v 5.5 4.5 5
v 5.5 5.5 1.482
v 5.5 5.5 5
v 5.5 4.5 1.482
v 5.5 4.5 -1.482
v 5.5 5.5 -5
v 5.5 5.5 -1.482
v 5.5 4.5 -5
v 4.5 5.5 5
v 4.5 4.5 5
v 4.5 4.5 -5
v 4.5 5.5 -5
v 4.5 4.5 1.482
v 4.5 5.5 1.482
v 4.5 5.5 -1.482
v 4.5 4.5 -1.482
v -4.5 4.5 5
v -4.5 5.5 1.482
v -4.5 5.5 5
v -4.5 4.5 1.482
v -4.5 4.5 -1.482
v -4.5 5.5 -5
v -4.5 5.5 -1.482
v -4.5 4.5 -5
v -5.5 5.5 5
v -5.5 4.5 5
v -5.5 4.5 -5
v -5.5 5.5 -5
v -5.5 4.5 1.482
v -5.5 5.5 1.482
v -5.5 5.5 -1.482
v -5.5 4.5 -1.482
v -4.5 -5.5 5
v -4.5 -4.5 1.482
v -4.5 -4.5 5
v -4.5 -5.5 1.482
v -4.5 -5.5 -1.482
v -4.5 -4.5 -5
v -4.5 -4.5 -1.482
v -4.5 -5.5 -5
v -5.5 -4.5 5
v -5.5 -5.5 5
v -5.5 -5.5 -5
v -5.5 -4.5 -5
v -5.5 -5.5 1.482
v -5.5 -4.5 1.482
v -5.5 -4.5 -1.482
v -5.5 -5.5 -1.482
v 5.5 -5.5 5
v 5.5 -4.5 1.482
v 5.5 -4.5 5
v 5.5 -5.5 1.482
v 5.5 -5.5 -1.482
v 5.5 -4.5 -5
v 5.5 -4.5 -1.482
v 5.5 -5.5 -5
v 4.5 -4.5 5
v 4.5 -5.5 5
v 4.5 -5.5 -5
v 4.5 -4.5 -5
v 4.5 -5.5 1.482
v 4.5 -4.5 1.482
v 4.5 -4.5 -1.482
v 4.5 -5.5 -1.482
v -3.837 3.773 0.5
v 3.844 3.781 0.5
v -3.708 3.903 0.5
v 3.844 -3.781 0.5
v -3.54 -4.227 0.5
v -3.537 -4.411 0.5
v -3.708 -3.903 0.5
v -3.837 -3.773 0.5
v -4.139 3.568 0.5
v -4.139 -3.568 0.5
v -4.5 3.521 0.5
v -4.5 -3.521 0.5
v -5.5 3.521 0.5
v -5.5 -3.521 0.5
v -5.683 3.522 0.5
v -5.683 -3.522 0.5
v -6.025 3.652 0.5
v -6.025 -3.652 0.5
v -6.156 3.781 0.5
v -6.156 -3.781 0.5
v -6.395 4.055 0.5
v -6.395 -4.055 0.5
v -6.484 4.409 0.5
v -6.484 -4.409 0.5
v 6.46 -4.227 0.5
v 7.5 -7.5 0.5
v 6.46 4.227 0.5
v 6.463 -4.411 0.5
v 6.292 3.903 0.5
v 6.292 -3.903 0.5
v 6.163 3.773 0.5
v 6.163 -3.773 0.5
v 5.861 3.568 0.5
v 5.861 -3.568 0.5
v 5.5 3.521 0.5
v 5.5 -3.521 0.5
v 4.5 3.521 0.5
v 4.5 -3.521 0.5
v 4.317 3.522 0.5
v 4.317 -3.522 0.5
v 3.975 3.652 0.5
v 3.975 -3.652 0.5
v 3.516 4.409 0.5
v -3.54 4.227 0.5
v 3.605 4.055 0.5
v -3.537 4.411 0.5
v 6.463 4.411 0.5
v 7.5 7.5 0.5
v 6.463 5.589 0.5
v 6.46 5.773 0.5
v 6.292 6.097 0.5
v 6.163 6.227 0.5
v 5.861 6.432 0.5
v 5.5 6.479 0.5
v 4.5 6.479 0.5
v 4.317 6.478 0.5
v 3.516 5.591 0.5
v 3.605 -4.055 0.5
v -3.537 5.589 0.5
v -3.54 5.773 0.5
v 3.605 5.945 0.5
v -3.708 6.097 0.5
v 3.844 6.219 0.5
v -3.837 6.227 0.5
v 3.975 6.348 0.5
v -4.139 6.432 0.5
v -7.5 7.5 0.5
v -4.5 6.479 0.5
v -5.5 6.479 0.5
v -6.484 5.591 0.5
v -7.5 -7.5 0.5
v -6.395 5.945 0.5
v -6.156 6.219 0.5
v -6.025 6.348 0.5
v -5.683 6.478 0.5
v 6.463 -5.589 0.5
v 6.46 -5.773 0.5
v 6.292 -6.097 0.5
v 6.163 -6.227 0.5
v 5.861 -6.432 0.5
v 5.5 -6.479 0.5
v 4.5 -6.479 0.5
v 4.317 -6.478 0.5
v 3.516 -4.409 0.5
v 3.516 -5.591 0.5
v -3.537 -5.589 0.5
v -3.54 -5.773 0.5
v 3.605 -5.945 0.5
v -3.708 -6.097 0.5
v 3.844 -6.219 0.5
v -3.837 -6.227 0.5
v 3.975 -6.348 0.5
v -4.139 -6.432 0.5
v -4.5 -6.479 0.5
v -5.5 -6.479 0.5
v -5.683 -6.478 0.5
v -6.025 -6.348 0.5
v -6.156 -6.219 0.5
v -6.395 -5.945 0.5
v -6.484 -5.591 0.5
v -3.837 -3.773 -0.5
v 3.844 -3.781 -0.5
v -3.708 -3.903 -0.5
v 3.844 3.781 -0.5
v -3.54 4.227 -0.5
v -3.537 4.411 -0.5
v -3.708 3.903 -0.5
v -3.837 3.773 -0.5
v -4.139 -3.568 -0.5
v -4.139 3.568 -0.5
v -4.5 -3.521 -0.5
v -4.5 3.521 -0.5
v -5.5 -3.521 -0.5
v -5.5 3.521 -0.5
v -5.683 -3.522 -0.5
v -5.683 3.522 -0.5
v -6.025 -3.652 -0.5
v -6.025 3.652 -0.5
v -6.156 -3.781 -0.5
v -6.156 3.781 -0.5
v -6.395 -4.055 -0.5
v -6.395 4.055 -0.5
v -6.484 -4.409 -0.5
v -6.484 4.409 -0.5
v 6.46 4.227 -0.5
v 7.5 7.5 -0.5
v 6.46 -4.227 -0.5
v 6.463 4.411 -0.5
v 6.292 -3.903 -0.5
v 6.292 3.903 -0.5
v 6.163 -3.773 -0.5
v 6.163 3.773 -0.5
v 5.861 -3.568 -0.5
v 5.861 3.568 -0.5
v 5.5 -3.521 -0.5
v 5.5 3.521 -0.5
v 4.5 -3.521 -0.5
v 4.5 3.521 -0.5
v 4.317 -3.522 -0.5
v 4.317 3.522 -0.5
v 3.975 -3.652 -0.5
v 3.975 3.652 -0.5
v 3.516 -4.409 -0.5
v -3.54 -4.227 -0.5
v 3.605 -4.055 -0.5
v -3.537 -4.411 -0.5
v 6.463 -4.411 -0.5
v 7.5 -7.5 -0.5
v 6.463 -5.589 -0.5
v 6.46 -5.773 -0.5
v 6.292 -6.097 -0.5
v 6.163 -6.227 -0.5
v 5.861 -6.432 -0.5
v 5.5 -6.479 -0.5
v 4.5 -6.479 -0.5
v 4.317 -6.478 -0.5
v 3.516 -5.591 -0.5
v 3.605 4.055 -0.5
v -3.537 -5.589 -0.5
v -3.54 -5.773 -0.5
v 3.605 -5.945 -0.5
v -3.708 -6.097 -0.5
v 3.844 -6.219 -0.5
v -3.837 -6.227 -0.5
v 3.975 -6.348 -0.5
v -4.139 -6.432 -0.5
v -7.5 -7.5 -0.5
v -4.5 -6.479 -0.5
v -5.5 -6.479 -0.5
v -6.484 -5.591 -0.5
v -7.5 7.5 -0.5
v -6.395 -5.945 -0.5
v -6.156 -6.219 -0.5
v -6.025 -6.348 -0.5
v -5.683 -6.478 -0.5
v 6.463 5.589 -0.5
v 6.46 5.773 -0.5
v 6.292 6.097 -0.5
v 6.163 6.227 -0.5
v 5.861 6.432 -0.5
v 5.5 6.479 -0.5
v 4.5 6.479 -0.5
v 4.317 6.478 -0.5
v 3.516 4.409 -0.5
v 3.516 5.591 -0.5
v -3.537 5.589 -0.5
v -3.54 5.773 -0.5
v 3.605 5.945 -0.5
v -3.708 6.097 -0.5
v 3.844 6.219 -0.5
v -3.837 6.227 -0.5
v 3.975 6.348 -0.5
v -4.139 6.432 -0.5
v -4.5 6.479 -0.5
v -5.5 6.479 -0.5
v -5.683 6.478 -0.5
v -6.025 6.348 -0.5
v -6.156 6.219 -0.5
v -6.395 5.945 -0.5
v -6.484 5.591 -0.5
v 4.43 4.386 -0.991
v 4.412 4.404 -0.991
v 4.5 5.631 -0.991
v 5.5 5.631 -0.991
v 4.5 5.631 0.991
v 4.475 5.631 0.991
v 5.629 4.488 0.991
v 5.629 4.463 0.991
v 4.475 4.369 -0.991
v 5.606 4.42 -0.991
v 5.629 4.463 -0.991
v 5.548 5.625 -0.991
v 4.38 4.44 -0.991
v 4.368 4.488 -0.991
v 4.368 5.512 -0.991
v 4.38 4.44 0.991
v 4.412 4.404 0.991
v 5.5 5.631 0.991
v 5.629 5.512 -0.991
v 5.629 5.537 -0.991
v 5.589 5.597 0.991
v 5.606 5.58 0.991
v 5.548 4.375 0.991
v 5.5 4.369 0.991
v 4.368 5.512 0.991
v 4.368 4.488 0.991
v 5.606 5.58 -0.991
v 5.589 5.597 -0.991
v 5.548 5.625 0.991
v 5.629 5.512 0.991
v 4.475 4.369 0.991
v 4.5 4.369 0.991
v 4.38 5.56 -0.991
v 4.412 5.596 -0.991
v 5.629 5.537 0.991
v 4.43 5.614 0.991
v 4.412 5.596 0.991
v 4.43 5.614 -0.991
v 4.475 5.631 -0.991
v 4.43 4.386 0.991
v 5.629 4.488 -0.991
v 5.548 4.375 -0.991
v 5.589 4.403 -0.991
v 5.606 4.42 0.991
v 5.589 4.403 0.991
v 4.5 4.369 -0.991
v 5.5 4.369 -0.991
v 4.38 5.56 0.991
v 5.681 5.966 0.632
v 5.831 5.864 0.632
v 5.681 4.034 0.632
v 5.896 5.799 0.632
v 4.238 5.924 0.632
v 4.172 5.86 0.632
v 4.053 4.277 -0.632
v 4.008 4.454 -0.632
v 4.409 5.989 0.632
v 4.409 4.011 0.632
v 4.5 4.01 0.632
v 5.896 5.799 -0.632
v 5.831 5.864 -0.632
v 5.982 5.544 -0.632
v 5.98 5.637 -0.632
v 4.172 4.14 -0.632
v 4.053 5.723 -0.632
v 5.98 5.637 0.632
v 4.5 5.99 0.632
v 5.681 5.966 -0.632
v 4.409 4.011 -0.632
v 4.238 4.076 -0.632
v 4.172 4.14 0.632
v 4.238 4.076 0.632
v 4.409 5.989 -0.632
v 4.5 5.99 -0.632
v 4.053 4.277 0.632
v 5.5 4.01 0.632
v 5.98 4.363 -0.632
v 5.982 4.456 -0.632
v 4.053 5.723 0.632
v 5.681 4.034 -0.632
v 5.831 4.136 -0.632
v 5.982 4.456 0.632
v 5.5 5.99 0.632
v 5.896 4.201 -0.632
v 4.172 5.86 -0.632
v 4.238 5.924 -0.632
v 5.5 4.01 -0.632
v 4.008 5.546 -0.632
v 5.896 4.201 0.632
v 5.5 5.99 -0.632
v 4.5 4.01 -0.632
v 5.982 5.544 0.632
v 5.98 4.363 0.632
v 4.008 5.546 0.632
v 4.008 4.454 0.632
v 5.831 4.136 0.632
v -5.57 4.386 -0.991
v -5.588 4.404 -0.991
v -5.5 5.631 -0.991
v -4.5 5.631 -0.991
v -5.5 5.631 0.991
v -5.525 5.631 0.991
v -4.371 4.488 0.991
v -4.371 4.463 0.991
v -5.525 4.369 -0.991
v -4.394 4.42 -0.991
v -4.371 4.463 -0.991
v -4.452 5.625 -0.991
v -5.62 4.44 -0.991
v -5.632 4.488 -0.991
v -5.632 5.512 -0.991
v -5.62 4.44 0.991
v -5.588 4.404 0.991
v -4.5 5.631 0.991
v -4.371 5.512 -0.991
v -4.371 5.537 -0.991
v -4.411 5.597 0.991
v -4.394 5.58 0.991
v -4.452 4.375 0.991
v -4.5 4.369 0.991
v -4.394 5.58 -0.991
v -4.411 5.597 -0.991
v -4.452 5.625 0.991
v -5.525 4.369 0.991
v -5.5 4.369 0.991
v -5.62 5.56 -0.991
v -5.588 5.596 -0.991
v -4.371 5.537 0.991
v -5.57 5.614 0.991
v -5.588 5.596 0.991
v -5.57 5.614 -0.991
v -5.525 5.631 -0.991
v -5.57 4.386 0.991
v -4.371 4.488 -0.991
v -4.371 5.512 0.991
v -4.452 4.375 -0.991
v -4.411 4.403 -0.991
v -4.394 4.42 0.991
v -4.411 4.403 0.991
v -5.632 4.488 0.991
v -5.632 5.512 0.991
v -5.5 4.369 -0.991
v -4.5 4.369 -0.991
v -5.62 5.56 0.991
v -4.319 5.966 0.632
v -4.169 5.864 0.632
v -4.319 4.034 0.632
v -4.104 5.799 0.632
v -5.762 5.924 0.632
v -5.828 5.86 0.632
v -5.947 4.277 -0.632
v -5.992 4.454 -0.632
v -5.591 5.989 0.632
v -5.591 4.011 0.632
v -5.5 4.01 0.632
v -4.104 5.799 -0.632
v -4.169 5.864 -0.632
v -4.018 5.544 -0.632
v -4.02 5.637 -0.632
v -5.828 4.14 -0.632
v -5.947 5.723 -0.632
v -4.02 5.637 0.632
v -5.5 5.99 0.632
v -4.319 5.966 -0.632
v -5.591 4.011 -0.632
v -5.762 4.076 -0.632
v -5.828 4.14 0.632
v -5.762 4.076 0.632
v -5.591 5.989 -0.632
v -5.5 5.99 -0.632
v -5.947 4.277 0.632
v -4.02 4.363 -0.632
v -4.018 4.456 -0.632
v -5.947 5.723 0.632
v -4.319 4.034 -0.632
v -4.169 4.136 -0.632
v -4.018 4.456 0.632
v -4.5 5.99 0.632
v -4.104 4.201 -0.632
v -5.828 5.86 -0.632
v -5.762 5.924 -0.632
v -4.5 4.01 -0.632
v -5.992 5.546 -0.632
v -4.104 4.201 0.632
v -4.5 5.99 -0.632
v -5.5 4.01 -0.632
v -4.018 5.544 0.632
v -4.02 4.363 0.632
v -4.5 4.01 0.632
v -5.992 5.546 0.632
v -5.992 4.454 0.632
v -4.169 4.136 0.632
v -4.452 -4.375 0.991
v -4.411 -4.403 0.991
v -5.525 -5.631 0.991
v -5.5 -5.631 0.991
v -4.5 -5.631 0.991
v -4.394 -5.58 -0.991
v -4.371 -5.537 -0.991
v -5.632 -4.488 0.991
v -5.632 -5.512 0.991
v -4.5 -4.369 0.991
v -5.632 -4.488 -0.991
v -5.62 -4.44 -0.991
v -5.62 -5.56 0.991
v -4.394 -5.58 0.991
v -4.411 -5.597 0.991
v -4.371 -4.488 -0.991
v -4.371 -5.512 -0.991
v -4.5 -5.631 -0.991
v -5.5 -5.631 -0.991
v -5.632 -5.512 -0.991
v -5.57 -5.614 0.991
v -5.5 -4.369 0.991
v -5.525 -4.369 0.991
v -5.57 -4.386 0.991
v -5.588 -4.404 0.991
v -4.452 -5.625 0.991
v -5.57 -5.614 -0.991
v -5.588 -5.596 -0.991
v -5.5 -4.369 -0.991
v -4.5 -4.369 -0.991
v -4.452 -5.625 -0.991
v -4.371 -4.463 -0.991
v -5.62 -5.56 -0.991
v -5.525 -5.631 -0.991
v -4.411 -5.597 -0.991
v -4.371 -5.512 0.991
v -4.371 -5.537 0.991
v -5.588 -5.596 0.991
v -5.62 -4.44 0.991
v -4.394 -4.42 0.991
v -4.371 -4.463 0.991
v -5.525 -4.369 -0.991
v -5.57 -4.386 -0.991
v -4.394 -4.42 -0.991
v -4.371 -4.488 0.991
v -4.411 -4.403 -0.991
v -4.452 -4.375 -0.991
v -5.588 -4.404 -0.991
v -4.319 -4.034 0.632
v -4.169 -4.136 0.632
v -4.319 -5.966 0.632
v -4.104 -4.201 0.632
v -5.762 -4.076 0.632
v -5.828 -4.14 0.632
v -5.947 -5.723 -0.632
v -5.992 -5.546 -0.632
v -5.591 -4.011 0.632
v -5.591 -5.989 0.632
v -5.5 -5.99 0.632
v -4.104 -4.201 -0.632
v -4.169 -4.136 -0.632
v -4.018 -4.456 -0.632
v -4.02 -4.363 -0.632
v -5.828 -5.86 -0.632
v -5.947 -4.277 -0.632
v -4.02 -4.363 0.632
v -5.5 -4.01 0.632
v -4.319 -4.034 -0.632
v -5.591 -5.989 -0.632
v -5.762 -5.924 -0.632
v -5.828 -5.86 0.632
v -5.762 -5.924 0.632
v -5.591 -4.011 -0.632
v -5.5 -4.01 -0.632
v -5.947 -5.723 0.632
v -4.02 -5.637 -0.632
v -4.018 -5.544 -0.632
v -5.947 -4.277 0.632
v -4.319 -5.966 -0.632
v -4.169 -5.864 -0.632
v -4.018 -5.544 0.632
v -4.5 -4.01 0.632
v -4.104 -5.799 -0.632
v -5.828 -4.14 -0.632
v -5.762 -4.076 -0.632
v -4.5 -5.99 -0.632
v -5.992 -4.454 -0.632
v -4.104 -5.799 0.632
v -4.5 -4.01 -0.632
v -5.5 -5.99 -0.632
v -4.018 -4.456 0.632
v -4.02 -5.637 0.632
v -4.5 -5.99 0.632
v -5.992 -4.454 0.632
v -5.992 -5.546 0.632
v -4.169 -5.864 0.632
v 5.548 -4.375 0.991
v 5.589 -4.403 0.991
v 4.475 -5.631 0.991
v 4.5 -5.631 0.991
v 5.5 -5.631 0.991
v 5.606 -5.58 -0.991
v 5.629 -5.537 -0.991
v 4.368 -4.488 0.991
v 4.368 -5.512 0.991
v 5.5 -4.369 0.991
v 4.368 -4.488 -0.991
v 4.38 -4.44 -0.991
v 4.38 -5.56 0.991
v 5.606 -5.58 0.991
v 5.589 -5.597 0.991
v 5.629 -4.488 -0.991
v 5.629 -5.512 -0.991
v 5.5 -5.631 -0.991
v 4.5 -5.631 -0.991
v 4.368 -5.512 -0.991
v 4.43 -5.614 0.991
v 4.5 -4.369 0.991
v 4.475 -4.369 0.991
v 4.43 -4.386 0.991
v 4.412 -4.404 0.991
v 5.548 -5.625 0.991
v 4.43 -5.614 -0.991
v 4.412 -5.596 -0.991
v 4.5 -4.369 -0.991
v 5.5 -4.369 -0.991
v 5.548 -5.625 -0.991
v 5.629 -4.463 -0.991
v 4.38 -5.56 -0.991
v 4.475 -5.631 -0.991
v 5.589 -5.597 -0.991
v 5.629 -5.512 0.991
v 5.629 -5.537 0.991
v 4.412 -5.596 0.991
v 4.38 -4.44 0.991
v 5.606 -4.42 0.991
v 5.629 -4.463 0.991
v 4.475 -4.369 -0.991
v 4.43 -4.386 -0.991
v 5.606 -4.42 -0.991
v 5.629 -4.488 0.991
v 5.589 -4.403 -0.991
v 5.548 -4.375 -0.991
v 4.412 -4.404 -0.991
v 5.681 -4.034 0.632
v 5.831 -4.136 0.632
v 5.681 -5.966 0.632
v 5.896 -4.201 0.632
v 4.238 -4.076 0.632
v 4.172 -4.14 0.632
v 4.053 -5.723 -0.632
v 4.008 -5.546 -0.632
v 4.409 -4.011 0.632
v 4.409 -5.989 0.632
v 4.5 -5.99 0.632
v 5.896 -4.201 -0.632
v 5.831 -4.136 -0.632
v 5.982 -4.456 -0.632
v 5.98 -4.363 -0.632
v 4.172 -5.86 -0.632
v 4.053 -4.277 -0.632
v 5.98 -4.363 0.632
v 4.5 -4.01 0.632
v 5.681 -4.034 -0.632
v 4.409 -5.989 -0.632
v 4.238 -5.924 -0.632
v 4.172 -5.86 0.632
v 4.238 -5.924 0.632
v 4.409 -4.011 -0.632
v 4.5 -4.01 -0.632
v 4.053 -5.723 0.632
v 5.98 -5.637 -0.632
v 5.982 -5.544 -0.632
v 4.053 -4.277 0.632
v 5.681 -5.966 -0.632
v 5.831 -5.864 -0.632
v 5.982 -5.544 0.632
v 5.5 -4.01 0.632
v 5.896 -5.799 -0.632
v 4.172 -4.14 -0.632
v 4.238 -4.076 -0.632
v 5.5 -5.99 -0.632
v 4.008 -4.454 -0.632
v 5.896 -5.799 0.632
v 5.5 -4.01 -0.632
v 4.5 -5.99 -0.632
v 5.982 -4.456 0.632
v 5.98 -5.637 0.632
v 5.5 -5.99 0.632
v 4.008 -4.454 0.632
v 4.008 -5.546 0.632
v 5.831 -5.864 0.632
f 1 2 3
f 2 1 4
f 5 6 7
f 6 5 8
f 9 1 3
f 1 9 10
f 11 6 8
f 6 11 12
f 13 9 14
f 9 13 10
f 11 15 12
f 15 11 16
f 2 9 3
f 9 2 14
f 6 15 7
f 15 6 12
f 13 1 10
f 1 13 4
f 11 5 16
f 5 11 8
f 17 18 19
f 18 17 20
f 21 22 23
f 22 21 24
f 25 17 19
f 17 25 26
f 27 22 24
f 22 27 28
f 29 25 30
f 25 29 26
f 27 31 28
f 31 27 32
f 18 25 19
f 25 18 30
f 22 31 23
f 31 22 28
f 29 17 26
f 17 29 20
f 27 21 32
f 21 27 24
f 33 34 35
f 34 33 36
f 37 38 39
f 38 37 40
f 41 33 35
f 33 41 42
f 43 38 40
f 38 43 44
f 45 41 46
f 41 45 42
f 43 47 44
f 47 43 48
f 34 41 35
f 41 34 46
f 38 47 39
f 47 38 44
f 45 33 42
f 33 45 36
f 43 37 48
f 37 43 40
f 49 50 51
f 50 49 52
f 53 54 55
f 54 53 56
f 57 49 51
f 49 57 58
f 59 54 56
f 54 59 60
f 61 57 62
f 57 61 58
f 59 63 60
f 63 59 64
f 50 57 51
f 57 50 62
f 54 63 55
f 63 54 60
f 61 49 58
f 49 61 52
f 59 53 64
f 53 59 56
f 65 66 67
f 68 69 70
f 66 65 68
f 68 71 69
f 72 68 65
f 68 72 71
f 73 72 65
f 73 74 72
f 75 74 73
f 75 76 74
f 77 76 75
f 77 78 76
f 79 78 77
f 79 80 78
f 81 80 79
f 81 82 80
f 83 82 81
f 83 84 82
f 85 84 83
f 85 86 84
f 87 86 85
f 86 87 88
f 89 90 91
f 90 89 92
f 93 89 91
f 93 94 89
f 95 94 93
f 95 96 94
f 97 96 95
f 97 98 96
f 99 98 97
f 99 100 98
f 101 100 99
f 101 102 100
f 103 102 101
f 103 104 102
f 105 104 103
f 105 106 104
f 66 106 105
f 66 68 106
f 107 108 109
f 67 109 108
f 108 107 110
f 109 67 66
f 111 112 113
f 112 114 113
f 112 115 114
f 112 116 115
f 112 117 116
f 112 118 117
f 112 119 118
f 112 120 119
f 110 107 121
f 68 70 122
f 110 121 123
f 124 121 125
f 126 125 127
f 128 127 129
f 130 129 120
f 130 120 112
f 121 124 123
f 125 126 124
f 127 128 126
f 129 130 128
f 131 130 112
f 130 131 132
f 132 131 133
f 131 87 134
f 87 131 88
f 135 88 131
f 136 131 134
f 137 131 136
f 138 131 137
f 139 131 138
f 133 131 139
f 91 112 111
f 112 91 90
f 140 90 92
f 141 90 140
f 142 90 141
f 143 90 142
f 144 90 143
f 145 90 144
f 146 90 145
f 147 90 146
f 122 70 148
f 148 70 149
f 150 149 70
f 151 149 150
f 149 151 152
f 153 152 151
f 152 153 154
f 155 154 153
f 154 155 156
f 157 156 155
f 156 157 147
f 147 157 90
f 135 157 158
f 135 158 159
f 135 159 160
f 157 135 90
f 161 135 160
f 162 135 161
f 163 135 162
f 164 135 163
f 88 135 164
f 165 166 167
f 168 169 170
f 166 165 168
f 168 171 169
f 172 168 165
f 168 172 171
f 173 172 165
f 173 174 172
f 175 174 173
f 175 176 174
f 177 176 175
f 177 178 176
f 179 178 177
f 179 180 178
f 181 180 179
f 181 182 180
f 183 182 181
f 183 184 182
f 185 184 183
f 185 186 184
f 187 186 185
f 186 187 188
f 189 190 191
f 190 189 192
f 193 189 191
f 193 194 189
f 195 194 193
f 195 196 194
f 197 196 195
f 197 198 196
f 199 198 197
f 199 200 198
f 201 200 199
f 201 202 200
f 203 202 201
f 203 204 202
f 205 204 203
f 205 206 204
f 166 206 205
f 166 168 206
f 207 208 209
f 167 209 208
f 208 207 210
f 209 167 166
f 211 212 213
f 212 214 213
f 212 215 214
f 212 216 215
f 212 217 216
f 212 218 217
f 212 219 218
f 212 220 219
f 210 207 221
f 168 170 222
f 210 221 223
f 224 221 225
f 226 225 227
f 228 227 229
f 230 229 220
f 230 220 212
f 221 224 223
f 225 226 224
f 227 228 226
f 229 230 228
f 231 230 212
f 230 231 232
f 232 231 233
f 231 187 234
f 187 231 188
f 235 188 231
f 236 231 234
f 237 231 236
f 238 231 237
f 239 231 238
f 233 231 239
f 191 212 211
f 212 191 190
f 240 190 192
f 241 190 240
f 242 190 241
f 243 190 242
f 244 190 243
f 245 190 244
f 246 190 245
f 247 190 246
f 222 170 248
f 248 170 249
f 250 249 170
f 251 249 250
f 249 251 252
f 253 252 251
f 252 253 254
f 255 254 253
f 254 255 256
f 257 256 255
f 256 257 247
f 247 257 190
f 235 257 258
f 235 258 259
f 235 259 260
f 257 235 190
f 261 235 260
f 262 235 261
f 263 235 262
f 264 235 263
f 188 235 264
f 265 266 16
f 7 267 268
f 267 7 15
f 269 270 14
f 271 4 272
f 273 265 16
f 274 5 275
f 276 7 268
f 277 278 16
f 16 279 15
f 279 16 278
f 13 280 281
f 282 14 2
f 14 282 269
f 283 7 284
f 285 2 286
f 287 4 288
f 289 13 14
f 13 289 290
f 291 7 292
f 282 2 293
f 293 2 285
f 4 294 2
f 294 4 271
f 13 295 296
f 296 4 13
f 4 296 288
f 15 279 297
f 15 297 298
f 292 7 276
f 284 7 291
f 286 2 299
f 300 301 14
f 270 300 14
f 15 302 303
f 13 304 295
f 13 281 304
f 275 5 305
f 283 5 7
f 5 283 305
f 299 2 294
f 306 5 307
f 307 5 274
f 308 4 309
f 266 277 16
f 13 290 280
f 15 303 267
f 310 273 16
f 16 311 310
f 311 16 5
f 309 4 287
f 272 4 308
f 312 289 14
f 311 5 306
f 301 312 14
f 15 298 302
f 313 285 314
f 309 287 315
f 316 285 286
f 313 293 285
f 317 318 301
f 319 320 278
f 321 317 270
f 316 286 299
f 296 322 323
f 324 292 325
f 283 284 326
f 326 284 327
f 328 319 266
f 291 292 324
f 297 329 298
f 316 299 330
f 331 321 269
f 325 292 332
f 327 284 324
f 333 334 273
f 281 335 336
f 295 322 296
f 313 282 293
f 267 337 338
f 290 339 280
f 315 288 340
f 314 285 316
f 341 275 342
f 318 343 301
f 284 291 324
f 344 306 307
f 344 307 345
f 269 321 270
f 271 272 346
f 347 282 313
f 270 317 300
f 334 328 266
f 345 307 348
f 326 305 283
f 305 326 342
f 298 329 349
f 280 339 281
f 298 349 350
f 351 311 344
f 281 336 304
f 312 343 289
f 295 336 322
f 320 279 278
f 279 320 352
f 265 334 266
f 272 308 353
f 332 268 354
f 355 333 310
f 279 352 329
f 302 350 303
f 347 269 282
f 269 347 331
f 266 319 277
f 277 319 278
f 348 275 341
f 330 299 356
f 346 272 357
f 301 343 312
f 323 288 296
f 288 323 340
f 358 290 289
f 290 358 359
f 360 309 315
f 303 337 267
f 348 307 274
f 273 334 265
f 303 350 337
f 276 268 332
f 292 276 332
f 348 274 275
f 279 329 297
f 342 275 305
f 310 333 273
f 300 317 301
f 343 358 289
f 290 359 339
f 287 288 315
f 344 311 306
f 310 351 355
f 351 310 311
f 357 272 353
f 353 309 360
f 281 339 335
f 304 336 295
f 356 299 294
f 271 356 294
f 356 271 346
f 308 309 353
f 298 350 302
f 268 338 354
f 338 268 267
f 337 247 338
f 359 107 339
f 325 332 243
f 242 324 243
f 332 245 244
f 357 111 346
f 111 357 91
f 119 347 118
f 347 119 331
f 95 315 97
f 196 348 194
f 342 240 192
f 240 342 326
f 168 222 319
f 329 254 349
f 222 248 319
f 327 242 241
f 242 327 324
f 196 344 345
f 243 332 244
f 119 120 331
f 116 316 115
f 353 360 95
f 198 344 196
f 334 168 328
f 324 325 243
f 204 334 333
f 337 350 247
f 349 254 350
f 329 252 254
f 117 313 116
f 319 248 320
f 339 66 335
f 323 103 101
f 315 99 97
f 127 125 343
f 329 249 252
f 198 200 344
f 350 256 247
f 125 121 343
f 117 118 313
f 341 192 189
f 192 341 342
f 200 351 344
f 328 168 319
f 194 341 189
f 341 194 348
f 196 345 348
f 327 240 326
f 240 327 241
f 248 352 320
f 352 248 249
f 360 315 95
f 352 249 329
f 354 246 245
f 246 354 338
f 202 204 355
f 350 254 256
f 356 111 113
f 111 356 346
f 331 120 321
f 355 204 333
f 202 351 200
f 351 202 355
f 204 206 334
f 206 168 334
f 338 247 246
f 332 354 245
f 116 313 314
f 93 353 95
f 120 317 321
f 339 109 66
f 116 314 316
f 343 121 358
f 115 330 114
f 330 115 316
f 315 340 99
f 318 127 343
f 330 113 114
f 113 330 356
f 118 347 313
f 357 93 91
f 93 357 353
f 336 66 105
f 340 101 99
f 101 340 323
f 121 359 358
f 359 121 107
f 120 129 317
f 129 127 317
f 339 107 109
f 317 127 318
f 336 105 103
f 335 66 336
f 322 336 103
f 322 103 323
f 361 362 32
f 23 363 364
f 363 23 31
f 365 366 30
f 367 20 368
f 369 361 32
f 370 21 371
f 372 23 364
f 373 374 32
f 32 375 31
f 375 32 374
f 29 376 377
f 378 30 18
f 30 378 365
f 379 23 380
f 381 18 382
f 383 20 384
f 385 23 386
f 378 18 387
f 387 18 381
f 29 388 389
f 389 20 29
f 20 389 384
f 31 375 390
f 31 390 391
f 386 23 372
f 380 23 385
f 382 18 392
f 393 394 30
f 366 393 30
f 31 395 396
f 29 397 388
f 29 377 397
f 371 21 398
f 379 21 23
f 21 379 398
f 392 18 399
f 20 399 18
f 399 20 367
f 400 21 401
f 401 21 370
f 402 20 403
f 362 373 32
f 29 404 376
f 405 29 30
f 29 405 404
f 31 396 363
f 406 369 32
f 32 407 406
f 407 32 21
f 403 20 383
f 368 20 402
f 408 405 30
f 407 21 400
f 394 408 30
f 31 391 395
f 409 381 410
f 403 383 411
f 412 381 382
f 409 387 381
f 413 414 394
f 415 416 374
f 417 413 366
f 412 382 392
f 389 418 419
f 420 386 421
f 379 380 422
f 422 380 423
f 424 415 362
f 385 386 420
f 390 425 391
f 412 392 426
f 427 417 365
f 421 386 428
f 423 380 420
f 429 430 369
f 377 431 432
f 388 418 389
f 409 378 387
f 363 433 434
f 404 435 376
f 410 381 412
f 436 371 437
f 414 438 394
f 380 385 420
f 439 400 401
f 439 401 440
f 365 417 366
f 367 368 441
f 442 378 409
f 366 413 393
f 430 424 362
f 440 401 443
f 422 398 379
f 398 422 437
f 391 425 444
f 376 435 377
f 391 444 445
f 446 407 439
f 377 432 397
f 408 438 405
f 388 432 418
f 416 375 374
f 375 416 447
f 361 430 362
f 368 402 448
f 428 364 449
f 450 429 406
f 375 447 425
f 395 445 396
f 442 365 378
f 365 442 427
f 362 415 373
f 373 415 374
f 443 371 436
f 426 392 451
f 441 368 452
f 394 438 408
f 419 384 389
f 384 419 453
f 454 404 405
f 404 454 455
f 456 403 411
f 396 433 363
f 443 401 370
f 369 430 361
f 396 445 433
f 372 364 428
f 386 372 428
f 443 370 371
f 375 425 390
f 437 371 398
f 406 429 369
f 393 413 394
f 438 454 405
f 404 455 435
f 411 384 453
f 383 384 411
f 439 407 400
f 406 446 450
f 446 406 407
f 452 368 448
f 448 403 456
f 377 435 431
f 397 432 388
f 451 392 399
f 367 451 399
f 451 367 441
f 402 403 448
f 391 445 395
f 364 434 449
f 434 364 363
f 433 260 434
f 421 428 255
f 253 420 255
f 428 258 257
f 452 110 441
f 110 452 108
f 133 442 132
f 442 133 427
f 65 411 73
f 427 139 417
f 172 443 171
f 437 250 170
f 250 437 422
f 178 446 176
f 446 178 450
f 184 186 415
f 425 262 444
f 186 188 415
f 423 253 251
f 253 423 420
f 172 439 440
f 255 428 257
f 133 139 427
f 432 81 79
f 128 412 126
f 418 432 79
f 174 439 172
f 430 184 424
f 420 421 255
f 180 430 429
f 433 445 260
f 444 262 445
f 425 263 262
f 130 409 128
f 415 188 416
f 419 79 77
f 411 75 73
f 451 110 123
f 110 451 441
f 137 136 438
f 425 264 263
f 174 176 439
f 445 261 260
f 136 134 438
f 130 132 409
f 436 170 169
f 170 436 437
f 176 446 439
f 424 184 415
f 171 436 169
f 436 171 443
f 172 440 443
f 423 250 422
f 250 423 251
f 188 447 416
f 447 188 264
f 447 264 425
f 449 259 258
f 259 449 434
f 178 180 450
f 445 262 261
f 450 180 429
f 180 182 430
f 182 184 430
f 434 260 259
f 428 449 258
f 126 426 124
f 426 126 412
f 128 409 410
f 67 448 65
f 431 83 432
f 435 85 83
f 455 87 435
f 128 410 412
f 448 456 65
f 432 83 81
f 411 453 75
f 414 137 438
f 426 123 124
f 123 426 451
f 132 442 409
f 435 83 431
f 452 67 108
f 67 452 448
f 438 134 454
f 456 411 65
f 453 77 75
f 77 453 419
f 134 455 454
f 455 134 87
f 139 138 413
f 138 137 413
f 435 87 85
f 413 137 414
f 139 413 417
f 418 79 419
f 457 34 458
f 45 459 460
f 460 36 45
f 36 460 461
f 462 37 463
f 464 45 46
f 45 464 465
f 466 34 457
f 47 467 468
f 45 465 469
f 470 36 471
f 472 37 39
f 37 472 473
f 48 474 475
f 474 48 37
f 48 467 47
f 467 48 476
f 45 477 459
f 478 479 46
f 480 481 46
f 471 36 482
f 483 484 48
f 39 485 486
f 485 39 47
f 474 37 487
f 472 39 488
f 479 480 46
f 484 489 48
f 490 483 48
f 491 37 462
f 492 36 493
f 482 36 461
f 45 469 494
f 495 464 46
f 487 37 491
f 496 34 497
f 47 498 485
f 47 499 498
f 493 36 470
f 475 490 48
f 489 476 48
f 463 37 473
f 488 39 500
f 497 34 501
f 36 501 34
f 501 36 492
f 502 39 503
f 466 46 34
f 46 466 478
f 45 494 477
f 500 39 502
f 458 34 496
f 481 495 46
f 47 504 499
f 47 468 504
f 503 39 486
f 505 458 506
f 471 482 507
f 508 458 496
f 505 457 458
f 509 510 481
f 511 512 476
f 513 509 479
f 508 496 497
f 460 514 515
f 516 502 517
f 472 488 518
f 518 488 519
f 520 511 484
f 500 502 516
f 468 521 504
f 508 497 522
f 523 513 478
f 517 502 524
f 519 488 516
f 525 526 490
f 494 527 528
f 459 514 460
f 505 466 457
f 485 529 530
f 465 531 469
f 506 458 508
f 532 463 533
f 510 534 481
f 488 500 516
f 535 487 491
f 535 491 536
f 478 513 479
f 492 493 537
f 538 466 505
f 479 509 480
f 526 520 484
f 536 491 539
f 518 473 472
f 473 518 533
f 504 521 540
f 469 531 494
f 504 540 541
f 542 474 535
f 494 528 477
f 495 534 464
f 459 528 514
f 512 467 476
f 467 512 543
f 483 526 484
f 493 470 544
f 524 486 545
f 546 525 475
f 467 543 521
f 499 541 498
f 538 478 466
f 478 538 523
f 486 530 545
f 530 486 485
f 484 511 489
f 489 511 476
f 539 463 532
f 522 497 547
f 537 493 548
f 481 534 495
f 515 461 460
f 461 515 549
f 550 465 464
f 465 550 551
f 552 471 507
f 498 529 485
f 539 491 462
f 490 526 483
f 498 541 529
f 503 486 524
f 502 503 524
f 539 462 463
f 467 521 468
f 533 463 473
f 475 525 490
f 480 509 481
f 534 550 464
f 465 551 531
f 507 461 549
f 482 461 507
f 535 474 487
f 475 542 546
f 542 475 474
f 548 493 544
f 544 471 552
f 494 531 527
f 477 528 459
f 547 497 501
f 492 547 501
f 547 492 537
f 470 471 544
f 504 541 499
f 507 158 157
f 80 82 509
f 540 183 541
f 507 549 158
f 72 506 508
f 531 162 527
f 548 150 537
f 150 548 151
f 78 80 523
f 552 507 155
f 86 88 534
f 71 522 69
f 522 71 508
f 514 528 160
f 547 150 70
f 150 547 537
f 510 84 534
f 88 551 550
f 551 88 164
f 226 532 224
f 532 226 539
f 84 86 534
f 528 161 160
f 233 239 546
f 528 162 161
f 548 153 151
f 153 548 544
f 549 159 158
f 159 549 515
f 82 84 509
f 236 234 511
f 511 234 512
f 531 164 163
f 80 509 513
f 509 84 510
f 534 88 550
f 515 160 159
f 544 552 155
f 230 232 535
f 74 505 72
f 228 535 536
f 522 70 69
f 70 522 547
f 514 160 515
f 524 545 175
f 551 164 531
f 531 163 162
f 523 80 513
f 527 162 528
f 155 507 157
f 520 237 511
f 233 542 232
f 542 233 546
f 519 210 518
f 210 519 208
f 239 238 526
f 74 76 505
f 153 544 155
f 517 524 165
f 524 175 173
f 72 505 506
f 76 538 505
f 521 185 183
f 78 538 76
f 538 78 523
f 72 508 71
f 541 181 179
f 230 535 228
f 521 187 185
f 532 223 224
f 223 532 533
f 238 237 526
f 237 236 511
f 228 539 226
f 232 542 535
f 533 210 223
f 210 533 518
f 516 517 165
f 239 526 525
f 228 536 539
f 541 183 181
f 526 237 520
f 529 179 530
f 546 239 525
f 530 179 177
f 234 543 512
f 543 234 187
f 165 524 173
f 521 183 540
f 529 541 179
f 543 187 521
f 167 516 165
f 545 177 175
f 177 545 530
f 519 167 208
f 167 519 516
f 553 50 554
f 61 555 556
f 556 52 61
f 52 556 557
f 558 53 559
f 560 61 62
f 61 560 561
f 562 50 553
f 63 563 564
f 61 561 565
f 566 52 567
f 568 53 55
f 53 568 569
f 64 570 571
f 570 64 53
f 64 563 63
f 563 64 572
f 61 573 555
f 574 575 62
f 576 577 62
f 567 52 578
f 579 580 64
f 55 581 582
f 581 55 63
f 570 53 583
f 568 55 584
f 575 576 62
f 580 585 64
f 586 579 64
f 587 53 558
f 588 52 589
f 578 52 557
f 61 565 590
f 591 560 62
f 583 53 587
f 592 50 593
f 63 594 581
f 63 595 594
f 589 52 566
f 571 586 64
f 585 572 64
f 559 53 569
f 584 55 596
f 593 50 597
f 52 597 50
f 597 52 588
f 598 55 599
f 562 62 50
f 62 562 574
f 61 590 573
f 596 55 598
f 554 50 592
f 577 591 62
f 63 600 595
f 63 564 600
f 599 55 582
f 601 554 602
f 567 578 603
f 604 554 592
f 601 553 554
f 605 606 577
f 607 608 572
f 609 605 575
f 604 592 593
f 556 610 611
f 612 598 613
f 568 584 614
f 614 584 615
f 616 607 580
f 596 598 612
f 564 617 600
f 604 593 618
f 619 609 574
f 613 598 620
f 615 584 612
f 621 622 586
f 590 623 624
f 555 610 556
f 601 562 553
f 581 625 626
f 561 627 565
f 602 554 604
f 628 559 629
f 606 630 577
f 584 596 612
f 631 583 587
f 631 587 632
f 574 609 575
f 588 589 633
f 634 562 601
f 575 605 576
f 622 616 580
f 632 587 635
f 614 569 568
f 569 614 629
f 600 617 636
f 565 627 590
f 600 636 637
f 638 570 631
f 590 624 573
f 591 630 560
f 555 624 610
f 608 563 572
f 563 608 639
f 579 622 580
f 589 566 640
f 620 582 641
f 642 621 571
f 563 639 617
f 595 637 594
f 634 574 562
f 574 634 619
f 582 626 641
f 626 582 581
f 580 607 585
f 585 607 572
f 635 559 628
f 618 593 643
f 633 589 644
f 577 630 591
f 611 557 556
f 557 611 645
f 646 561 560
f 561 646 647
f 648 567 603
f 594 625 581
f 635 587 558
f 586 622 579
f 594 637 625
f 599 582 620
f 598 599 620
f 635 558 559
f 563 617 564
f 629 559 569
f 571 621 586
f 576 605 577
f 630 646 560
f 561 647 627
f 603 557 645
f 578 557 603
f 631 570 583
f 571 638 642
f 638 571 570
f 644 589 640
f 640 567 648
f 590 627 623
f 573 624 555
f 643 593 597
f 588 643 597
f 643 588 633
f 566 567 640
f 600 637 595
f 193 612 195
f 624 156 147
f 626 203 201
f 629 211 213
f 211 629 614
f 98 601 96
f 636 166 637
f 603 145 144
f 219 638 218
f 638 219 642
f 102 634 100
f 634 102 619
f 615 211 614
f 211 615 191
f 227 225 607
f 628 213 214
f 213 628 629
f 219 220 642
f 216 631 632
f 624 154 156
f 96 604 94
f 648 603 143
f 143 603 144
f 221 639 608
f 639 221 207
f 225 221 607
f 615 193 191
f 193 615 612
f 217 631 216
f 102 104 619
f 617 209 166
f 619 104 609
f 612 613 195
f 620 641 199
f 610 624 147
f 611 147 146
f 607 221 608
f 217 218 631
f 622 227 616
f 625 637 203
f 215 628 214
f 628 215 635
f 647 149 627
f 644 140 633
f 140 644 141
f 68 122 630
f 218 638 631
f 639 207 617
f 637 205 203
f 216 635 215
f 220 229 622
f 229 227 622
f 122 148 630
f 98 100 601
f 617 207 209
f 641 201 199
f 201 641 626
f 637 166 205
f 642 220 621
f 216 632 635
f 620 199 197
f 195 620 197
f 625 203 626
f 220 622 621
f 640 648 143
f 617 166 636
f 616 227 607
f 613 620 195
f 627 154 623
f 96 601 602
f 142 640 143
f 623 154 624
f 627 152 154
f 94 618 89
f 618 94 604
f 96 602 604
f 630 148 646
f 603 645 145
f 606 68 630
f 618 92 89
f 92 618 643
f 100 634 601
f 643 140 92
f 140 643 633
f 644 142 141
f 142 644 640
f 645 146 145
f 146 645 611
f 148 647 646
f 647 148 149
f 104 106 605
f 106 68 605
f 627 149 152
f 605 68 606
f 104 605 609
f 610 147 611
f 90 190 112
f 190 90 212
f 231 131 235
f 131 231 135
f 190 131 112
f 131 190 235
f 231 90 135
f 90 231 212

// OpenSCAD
// file: unionRoundMask.scad
    ////////////////////////////////////////////////////////
    /*
    unionRound() 1.0 Module by Torleif Ceder - TLC123 late summer 2021
     Pretty fast Union with radius, But limited to a subset of cases
    Usage 
     unionRound( radius , detail  )
        {
         YourObject1();
         YourObject2(); 
        } 
      unionRoundMask (r, detail , epsilon ,showMask )
        {
         YourObject1();
         YourObject2(); 
         YourMask();
         YourMask();   
         
         // ...
         // ...
         // ...
         
        } 
    limitations: 
     0. Only really fast when boolean operands are convex, 
            Minkowski is fast in that case. 
     1. Boolean operands may be concave but can only touch 
            in a single convex area
     2. Radius is of elliptic type and is only approximate r
            were operand intersect at perpendicular angle. 
    */
    //////////////////////////////////////////////////////// 
    // Demo code
    demo= false;
    if (demo)  
     unionRoundMask(1.5, 5) {
     cube([10,10,2],true);
     rotate([20,-10,0])cylinder(5,1,1,$fn=12);   
     cube([1.5,10,6],center=true); //mask
      rotate(90)
     cube([1.5,10,6],center=true); //mask
    }
    
    // end of demo code
    //
    module unionRoundMask(r, detail = 5,q=70, epsilon = 1e-6, showMask = true) {
    //automask if none
    if($children <=2){
        unionRoundMask(r,detail,q,epsilon,showMask)
        {
            children(0);
            children(1);
            clad(r,q) intersection(){
                    children(0);
                    children(1);
                }
            }
            }
    else {
    union() {
        children(0);
        children(1);
        if (showMask && $children > 2) %
            for (i = [2: max(2, $children - 1)]) children(i);

        if ($children > 2)
            for (i = [2: max(2, $children - 1)]) {
                intersection() {
                    children(i);

                    unionRound(r, detail,q, epsilon) {
                        intersection() {
                            children(0);
                            children(i); // mask
                        }
                        intersection() {
                            children(1);
                            children(i); // mask
                        }
                    }
                }
            }
        }
     }
}
    
    
    module unionRound(r, detail = 5,q=70,  epsilon = 1e-6) {
        
        children(0);
        children(1);
        step = 90 / detail;
      union()for (i = [0:  detail-1]) {
            {
                x = r - sin(i * step ) * r;
                y = r - cos(i * step ) * r;
                xi = r - sin((i * step + step)  ) * r;
                yi = r - cos((i * step + step)  ) * r;
                color(rands(0, 1, 3, i))
                hull() {
                    intersection() {
                        // shell(epsilon) 
                        clad(x,q) children(0);
                        // shell(epsilon) 
                        clad(y,q) children(1);
                    }
                    intersection() {
                        // shell(epsilon) 
                        clad(xi,q) children(0);
                        // shell(epsilon) 
                        clad(yi,q) children(1);
                    }
                }
            }
        }
    }
    
    // prototype module slow maybe on concave feature
    module intersectionRound(r, q=70,  epsilon = 1e-6,showOperands = true) {
        %if (showOperands){children(0);
        children(1);}
 
                    clad(r,q) inset(r,q)
                     hull()intersection() {
                           children(0);
                           children(1);
                    }
 
    }
    
    // unionRound helper expand by r
    module clad(r,q=70) {
        minkowski() {
            children();
            //        icosphere(r,2);
             isosphere(r,q); 
        }
    }
    // unionRound helper
    module shell(r,q=70) {
        difference() {
            clad(r,q) children();
            children();
        }
    }
    
    // inset 3d  "negative offset", optimally on convex hull
    // else jagged inner corners by q quality factor 
    module inset(r,q=20){
    a= generatepoints(q)*r;
    //#children();
    intersection_for(t=a){
      translate(t ) children();
    }
}
    
    
    /*    
    // The following is a sphere with some equidistant properties.
    // Not strictly necessary

    Kogan, Jonathan (2017) "A New Computationally Efficient Method for Spacing n Points on a Sphere," Rose-Hulman Undergraduate Mathematics Journal: Vol. 18 : Iss. 2 , Article 5.
    Available at: https://scholar.rose-hulman.edu/rhumj/vol18/iss2/5 */
    
    function sphericalcoordinate(x,y)=  [cos(x  )*cos(y  ), sin(x  )*cos(y  ), sin(y  )];
    function NX(n=70,x)= 
    let(toDeg=57.2958,PI=acos(-1)/toDeg,
    start=(-1.+1./(n-1.)),increment=(2.-2./(n-1.))/(n-1.) )
    [ for (j= [0:n-1])let (s=start+j*increment )
    sphericalcoordinate(   s*x*toDeg,  PI/2.* sign(s)*(1.-sqrt(1.-abs(s)))*toDeg)];
    function generatepoints(n=70)= NX(n,0.1+1.2*n);
    module isosphere(r,q=70){
    a= generatepoints(q);
    scale(r)hull()polyhedron(a,[[for(i=[0:len(a)-1])i]]);
    }
// main file
include<unionRoundMask.scad>
 
 
 
 unionRoundMask(1,3,showMask=true)
 {
    color("red") cube([15,15,1 ] ,true);
     union(){
   translate([5,5]) color("blue") cube([1, 1 ,10] ,true);
   translate([-5,5]) color("blue") cube([1, 1 ,10] ,true);
   translate([-5,-5]) color("blue") cube([1, 1 ,10] ,true);
   translate([5,-5]) color("blue") cube([1, 1 ,10] ,true);
     }
   //masks
   
   translate([ 5, 5])   cube(4 ,true);
   translate([-5, 5])   cube(4 ,true);
   translate([-5,-5])   cube(4 ,true);
   translate([ 5,-5])   cube(4 ,true);
     
     
     
     
     }
